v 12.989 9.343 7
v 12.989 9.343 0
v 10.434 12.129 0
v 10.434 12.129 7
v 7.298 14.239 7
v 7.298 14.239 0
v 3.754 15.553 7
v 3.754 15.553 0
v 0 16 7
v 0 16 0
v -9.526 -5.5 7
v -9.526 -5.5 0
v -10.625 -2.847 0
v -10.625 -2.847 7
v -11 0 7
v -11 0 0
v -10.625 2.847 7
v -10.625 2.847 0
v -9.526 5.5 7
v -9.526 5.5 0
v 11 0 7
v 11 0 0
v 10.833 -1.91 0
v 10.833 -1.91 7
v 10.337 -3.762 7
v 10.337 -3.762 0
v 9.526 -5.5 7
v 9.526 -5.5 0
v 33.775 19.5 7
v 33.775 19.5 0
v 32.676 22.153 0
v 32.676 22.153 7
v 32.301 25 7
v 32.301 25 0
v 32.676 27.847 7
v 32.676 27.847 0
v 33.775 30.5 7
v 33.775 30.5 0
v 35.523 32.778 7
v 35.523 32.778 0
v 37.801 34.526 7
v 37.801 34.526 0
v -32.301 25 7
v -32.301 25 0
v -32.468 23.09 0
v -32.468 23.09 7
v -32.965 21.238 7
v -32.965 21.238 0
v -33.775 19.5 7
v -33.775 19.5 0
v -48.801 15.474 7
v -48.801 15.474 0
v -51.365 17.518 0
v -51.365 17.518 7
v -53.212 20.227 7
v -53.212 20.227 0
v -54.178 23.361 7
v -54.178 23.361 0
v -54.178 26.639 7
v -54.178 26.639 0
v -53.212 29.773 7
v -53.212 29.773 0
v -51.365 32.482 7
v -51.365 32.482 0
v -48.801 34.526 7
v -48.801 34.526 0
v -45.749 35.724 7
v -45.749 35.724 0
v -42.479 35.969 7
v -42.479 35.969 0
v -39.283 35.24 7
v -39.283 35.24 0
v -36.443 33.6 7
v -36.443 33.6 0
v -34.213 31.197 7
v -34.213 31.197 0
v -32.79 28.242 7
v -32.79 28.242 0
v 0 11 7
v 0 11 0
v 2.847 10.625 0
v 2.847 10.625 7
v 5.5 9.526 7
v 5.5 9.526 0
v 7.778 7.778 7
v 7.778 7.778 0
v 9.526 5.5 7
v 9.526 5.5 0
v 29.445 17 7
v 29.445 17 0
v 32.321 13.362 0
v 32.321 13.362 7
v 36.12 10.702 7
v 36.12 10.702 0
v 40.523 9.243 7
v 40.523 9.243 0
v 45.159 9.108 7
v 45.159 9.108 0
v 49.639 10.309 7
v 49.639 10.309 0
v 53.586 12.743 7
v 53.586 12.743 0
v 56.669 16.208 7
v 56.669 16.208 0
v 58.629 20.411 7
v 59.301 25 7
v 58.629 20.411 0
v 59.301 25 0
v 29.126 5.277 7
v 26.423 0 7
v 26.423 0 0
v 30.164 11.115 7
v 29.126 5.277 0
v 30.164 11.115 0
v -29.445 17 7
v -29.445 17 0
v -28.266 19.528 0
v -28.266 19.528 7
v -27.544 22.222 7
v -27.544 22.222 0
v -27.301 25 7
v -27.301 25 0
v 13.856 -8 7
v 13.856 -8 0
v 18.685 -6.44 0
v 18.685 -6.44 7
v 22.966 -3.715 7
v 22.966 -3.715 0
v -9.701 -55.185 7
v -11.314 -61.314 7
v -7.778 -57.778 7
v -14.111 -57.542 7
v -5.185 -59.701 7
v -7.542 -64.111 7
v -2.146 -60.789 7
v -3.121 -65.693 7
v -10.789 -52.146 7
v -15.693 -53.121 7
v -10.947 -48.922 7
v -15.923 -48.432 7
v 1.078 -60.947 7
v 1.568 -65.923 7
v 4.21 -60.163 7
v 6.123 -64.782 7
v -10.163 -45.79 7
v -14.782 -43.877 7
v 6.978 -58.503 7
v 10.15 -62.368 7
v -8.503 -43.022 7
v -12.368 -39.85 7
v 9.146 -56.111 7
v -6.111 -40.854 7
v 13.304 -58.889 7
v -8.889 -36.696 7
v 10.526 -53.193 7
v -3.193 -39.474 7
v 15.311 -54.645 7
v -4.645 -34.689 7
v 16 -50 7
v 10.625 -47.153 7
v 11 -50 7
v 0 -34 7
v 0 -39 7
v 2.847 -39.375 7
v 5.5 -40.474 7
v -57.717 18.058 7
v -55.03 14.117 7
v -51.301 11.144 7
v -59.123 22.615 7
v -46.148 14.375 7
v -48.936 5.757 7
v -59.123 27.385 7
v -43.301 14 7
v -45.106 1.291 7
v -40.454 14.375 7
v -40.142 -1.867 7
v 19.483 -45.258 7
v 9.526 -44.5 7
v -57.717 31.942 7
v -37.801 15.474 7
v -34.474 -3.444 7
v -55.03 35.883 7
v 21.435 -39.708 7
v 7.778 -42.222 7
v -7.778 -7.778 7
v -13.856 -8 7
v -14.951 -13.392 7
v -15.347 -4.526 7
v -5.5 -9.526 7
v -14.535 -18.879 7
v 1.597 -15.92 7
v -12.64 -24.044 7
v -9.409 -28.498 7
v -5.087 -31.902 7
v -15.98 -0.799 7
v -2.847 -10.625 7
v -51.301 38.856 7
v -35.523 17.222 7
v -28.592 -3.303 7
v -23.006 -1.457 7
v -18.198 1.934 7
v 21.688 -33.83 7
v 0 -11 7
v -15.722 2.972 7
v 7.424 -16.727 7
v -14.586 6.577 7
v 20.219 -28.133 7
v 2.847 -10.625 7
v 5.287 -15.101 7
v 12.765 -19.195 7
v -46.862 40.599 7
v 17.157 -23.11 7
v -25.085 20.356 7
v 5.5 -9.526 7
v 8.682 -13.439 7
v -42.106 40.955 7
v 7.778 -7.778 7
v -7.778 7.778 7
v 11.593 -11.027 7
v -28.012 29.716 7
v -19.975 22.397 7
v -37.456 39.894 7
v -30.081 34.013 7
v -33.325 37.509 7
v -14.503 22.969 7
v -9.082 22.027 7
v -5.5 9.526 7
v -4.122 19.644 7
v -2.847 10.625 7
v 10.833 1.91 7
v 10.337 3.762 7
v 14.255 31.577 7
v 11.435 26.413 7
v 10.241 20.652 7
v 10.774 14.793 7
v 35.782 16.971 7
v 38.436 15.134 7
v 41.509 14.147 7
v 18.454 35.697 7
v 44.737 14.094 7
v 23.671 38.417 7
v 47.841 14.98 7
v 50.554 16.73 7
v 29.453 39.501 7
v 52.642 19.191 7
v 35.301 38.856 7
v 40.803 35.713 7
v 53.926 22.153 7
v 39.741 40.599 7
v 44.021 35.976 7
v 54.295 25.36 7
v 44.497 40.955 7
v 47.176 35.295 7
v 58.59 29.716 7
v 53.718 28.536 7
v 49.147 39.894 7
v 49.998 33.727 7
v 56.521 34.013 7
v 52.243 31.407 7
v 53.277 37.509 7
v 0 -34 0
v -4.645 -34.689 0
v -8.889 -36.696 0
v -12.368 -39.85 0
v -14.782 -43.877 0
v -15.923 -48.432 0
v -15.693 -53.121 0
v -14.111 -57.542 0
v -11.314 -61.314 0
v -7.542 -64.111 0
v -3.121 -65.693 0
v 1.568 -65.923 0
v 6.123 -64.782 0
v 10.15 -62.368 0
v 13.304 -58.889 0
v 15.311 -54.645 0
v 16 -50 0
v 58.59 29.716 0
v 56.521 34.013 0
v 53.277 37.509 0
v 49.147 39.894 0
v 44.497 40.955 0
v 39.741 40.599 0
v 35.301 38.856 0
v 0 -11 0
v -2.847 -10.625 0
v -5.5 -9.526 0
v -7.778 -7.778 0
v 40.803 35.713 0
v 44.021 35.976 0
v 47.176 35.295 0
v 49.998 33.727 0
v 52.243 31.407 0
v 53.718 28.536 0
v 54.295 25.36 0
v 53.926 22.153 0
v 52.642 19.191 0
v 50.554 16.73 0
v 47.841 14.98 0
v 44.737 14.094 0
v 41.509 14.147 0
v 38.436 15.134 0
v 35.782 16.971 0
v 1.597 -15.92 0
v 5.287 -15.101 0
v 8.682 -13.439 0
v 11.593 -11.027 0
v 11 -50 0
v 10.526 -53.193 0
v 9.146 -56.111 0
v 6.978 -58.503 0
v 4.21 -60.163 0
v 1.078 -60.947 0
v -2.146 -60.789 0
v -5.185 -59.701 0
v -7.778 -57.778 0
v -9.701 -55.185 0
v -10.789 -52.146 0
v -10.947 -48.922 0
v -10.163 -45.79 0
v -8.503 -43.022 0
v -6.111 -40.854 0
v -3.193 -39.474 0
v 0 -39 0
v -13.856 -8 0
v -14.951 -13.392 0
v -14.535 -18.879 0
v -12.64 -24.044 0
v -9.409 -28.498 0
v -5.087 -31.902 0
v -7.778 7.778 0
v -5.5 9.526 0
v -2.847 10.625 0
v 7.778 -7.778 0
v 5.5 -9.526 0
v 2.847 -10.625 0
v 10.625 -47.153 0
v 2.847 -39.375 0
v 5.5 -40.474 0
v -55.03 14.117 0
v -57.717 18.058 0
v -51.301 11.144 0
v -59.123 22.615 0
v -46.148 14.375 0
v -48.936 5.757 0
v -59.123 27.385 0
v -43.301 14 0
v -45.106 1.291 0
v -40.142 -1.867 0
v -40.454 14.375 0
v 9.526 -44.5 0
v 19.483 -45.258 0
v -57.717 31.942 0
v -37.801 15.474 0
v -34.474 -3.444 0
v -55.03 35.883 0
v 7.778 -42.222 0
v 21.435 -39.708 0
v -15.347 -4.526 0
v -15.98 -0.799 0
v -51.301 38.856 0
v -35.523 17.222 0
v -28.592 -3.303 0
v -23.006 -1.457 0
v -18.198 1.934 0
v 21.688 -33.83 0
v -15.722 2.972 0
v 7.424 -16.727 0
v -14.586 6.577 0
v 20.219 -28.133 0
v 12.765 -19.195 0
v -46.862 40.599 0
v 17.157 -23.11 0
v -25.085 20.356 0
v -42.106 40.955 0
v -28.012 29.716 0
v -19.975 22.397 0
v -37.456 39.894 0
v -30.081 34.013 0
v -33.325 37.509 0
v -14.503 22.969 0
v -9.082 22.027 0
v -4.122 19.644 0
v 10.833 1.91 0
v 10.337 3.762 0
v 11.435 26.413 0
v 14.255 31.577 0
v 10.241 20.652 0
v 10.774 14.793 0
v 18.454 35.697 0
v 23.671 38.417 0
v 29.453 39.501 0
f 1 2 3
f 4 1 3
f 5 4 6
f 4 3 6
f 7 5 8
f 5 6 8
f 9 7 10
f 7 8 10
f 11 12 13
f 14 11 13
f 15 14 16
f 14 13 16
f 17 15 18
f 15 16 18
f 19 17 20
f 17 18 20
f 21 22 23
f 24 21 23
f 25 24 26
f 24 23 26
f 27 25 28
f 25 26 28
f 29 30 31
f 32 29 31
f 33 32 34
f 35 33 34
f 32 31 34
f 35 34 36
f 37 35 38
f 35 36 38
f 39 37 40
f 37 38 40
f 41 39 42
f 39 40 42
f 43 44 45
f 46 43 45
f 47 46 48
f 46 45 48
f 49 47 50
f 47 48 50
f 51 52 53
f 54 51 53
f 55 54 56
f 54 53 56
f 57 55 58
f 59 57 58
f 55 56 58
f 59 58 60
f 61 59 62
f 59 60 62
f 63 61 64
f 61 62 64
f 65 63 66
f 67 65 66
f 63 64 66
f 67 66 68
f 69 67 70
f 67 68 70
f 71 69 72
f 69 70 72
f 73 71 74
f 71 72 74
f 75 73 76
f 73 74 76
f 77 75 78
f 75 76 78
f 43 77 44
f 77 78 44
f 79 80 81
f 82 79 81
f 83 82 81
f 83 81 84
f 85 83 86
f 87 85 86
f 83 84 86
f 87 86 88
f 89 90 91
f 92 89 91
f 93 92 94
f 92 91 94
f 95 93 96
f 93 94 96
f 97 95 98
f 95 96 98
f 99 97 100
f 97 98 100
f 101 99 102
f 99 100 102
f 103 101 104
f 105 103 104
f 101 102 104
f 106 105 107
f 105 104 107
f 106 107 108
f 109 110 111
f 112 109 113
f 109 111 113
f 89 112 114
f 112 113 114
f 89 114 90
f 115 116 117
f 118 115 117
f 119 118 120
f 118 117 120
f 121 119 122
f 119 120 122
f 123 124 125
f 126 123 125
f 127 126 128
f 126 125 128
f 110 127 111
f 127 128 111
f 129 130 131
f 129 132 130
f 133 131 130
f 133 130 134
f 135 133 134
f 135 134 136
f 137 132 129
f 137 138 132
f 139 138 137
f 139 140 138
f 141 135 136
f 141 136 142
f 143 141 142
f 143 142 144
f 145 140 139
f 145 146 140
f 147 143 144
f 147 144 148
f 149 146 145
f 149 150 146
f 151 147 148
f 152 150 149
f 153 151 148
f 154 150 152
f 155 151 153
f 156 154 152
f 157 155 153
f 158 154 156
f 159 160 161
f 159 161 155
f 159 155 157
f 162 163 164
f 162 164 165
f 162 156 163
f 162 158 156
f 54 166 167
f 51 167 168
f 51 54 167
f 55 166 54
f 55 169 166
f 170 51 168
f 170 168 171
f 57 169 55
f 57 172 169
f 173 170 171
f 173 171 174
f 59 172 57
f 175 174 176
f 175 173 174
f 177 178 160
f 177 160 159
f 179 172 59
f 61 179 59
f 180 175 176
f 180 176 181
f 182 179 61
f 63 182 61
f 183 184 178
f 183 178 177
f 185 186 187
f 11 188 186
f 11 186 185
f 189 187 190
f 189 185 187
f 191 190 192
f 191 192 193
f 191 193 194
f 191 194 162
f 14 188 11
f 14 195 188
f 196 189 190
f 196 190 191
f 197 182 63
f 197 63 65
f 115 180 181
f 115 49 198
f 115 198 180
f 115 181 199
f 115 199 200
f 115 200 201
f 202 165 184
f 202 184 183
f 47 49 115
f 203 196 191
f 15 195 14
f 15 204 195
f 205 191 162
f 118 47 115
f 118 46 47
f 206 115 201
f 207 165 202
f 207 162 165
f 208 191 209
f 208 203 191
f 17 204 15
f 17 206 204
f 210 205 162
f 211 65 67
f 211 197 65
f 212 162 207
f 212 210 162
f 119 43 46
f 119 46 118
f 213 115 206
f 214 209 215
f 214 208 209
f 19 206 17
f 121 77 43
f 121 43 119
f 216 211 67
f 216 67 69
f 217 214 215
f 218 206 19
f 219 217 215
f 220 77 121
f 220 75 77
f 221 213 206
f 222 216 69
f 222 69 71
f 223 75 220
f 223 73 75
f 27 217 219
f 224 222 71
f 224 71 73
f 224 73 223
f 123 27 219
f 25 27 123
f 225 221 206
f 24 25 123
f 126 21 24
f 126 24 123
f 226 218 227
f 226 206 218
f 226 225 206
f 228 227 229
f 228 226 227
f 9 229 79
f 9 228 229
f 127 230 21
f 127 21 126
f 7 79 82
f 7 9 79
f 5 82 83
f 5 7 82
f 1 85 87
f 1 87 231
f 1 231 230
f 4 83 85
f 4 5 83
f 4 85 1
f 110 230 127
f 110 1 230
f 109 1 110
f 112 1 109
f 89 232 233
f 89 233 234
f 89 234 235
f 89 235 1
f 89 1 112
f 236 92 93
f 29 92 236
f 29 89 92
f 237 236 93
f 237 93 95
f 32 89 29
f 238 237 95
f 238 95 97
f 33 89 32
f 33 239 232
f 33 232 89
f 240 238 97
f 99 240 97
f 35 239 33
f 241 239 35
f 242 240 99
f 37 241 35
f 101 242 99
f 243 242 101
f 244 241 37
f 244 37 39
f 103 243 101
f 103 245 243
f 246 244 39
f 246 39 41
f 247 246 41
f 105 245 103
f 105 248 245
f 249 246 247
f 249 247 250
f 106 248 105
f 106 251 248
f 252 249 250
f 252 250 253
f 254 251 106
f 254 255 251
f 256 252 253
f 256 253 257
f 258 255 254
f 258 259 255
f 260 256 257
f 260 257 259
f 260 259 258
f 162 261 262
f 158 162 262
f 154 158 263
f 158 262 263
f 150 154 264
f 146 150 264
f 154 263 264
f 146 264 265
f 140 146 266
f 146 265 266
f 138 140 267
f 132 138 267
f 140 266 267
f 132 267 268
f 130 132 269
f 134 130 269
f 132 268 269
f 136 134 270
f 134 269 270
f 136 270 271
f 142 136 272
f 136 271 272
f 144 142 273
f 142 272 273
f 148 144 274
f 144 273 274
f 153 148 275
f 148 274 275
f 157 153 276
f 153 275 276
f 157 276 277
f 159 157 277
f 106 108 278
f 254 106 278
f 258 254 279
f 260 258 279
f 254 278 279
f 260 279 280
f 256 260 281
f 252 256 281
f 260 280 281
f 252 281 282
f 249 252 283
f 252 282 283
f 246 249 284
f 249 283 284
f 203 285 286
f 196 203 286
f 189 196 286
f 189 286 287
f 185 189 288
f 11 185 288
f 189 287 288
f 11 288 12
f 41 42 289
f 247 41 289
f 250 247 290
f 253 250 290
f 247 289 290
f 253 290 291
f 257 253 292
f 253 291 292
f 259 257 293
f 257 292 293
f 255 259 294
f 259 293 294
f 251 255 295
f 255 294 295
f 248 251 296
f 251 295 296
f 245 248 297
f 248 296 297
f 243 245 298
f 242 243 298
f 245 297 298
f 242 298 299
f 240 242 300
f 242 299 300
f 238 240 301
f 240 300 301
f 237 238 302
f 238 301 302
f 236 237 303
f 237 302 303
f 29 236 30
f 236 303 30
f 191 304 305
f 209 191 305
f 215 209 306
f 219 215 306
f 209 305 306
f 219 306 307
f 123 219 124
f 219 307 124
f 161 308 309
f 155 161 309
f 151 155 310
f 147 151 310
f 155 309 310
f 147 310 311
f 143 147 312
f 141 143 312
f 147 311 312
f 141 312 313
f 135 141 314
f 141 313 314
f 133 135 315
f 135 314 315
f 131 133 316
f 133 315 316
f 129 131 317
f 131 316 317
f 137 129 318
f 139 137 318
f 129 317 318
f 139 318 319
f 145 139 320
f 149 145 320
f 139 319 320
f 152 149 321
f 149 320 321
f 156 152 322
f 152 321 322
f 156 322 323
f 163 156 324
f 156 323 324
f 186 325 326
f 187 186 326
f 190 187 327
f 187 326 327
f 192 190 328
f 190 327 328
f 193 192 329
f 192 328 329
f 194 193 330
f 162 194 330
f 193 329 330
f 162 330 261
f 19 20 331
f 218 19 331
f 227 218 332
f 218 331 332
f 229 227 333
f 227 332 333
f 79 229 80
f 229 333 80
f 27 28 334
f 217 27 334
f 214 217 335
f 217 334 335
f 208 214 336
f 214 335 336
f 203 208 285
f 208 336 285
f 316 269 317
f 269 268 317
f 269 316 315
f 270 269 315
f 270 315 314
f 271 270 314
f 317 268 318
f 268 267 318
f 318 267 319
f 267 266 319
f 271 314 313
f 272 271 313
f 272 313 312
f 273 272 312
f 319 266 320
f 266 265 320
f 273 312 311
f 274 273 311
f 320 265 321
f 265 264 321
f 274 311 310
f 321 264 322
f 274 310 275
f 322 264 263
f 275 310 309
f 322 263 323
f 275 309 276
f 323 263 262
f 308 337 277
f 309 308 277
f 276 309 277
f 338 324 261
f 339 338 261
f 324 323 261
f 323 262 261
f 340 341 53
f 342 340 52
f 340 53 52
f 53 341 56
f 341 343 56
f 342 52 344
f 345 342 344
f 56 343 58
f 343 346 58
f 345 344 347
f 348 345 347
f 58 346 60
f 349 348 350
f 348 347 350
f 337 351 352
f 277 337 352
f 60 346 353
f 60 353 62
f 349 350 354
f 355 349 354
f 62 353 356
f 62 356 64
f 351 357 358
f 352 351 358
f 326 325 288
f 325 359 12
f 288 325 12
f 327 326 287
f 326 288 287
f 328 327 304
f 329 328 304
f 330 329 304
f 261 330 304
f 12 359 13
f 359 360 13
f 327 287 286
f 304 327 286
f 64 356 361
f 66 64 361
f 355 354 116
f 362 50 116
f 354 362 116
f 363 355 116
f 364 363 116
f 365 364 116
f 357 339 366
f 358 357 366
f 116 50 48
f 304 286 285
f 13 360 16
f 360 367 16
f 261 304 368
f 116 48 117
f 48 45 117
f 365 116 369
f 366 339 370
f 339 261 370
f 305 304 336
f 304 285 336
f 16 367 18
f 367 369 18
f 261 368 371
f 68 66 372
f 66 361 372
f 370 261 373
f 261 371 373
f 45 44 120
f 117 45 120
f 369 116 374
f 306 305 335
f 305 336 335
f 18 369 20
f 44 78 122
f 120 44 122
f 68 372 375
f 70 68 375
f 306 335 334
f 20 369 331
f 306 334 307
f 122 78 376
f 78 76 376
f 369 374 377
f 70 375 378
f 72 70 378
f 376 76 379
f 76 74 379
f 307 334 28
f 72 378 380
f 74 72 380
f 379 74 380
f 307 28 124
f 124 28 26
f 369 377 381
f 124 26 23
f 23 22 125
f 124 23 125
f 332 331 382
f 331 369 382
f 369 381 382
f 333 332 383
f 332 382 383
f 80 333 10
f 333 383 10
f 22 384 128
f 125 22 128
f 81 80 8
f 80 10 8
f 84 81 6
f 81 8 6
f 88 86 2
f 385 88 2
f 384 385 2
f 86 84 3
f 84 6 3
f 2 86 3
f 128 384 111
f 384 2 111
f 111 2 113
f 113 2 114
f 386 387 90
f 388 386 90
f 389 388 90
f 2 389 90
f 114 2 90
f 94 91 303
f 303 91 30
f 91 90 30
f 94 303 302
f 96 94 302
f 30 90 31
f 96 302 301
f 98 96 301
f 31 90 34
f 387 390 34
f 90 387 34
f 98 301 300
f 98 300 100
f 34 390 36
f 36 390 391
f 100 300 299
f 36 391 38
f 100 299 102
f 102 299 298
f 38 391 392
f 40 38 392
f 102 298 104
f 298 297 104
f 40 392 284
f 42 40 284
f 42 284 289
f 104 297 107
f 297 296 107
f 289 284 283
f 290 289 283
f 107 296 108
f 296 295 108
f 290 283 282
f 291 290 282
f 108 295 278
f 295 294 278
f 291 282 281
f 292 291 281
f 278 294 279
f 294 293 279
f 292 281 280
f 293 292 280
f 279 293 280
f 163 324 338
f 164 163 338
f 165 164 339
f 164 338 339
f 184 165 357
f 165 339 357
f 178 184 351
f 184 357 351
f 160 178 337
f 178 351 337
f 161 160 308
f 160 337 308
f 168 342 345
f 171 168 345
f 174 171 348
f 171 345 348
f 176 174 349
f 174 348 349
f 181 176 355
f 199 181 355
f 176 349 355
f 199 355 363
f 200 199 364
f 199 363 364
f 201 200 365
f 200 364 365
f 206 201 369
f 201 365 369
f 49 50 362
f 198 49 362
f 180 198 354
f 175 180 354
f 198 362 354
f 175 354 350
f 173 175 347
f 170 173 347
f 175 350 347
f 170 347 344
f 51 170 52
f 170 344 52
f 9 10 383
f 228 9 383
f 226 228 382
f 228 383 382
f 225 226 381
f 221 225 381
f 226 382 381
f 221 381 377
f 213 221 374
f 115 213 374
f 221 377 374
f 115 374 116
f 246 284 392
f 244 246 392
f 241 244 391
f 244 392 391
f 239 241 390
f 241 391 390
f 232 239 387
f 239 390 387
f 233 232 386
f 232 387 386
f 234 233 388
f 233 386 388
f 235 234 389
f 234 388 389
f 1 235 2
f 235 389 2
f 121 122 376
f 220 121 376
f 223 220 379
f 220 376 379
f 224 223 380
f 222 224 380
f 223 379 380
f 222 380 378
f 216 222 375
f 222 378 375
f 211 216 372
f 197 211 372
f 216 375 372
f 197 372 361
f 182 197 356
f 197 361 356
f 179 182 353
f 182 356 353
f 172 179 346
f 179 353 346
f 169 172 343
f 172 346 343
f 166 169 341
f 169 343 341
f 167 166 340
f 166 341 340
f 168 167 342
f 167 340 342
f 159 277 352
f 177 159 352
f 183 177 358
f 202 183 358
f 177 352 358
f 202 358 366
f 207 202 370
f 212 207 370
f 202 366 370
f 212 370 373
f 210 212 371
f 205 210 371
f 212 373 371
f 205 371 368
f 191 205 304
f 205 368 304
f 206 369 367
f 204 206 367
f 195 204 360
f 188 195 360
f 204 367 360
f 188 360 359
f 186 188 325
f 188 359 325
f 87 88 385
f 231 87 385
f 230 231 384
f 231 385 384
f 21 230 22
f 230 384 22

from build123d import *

# Parameters (mm, degrees)
F1_DEPTH = 7


# Not quite as in the source:
# - a feature names something its author has since deleted; it is built from what else it names


with BuildPart() as f1:
    # F0 (on Top) → F1 (new body)
    with BuildSketch(Plane.XY):
        with BuildLine():
            Line((16, 0), (11, 0))
            ThreePointArc((11, 0), (10.6251840892, -2.8470094961), (9.5262794416, -5.5))
            Line((9.5262794416, -5.5), (13.8564064606, -8))
            ThreePointArc((13.8564064606, -8), (15.4548132206, -4.1411047216), (16, 0))
        make_face()
        with BuildLine():
            ThreePointArc((9.5262794416, 5.5), (10.6251840892, 2.8470094961), (11, 0))
            Line((11, 0), (16, 0))
            ThreePointArc((16, 0), (15.4548132206, 4.1411047216), (13.8564064606, 8))
            Line((13.8564064606, 8), (9.5262794416, 5.5))
        make_face()
        with BuildLine():
            ThreePointArc((0, 11), (5.5, 9.5262794416), (9.5262794416, 5.5))
            Line((9.5262794416, 5.5), (13.8564064606, 8))
            ThreePointArc((13.8564064606, 8), (13.409185793, 8.6628012124), (12.9888150126, 9.3429483874))
            ThreePointArc((12.9888150126, 9.3429483874), (7.2976991512, 14.2388056767), (0, 16))
            Line((0, 16), (0, 11))
        make_face()
        with BuildLine():
            Line((13.8564064606, -8), (9.5262794416, -5.5))
            ThreePointArc((9.5262794416, -5.5), (5.5, -9.5262794416), (0, -11))
            Line((0, -11), (0, -16))
            ThreePointArc((0, -16), (0.7976130214, -15.944096147), (1.5968231434, -15.9201179596))
            ThreePointArc((1.5968231434, -15.9201179596), (8.68231786, -13.4393956924), (13.8564064606, -8))
        make_face()
        with BuildLine():
            Line((26.4227403385, 0), (16, 0))
            ThreePointArc((16, 0), (15.4548132206, -4.1411047216), (13.8564064606, -8))
            ThreePointArc((13.8564064606, -8), (20.912199664, -5.2136349503), (26.4227403385, 0))
        make_face()
        with BuildLine():
            ThreePointArc((13.8564064606, 8), (15.4548132206, 4.1411047216), (16, 0))
            Line((16, 0), (26.4227403385, 0))
            ThreePointArc((26.4227403385, 0), (29.8628617611, 8.1570672633), (29.4448637287, 17))
            Line((29.4448637287, 17), (13.8564064606, 8))
        make_face()
        with BuildLine():
            ThreePointArc((-9.5262794416, 5.5), (-5.5, 9.5262794416), (0, 11))
            Line((0, 11), (0, 16))
            ThreePointArc((0, 16), (-8, 13.8564064606), (-13.8564064606, 8))
            Line((-13.8564064606, 8), (-9.5262794416, 5.5))
        make_face()
        with BuildLine():
            ThreePointArc((12.9888150126, 9.3429483874), (13.409185793, 8.6628012124), (13.8564064606, 8))
            ThreePointArc((13.8564064606, 8), (13.4393956924, 8.68231786), (12.9888150126, 9.3429483874))
        make_face()
        with BuildLine():
            ThreePointArc((12.9888150126, 9.3429483874), (13.4393956924, 8.68231786), (13.8564064606, 8))
            Line((13.8564064606, 8), (29.4448637287, 17))
            ThreePointArc((29.4448637287, 17), (27.8464569686, 29.1411047216), (35.3012701892, 38.8564064606))
            ThreePointArc((35.3012701892, 38.8564064606), (14.2545680685, 31.576970296), (12.9888150126, 9.3429483874))
        make_face()
        with BuildLine():
            Line((0, -16), (0, -11))
            ThreePointArc((0, -11), (-5.5, -9.5262794416), (-9.5262794416, -5.5))
            Line((-9.5262794416, -5.5), (-13.8564064606, -8))
            ThreePointArc((-13.8564064606, -8), (-8, -13.8564064606), (0, -16))
        make_face()
        with BuildLine():
            ThreePointArc((-9.5262794416, -5.5), (-11, 0), (-9.5262794416, 5.5))
            Line((-9.5262794416, 5.5), (-13.8564064606, 8))
            ThreePointArc((-13.8564064606, 8), (-14.2067988144, 7.2812949346), (-14.585638156, 6.5771695722))
            ThreePointArc((-14.585638156, 6.5771695722), (-15.9800170112, -0.7994099843), (-13.8564064606, -8))
            Line((-13.8564064606, -8), (-9.5262794416, -5.5))
        make_face()
        with BuildLine():
            ThreePointArc((-13.8564064606, 8), (-8, 13.8564064606), (0, 16))
            ThreePointArc((0, 16), (-14.5027493597, 22.9685214121), (-29.4448637287, 17))
            Line((-29.4448637287, 17), (-13.8564064606, 8))
        make_face()
        with BuildLine():
            ThreePointArc((35.3012701892, 38.8564064606), (27.8464569686, 29.1411047216), (29.4448637287, 17))
            Line((29.4448637287, 17), (33.7749907476, 19.5))
            ThreePointArc((33.7749907476, 19.5), (32.6760861, 27.8470094961), (37.8012701892, 34.5262794416))
            Line((37.8012701892, 34.5262794416), (35.3012701892, 38.8564064606))
        make_face()
        with BuildLine():
            Line((33.7749907476, 19.5), (29.4448637287, 17))
            ThreePointArc((29.4448637287, 17), (47.4423749109, 9.5451867794), (59.3012701892, 25))
            ThreePointArc((59.3012701892, 25), (51.3012701892, 38.8564064606), (35.3012701892, 38.8564064606))
            Line((35.3012701892, 38.8564064606), (37.8012701892, 34.5262794416))
            ThreePointArc((37.8012701892, 34.5262794416), (48.8012701892, 34.5262794416), (54.3012701892, 25))
            ThreePointArc((54.3012701892, 25), (46.1482796853, 14.3748159108), (33.7749907476, 19.5))
        make_face()
        with BuildLine():
            Line((0, -34), (0, -16))
            ThreePointArc((0, -16), (-8, -13.8564064606), (-13.8564064606, -8))
            ThreePointArc((-13.8564064606, -8), (-12.6399483504, -24.0440100763), (0, -34))
        make_face()
        with BuildLine():
            ThreePointArc((1.5968231434, -15.9201179596), (0.7976130214, -15.944096147), (0, -16))
            ThreePointArc((0, -16), (0.7994099843, -15.9800170112), (1.5968231434, -15.9201179596))
        make_face()
        with BuildLine():
            ThreePointArc((1.5968231434, -15.9201179596), (0.7994099843, -15.9800170112), (0, -16))
            Line((0, -16), (0, -34))
            ThreePointArc((0, -34), (11.313708499, -38.686291501), (16, -50))
            ThreePointArc((16, -50), (20.2191744167, -28.1333032153), (1.5968231434, -15.9201179596))
        make_face()
        with BuildLine():
            ThreePointArc((-14.585638156, 6.5771695722), (-14.2067988144, 7.2812949346), (-13.8564064606, 8))
            ThreePointArc((-13.8564064606, 8), (-14.2388056767, 7.2976991512), (-14.585638156, 6.5771695722))
        make_face()
        with BuildLine():
            ThreePointArc((-14.585638156, 6.5771695722), (-14.2388056767, 7.2976991512), (-13.8564064606, 8))
            Line((-13.8564064606, 8), (-29.4448637287, 17))
            ThreePointArc((-29.4448637287, 17), (-39.1601654676, 9.5451867794), (-51.3012701892, 11.1435935394))
            ThreePointArc((-51.3012701892, 11.1435935394), (-34.4737424851, -3.4436670807), (-14.585638156, 6.5771695722))
        make_face()
        with BuildLine():
            ThreePointArc((-51.3012701892, 11.1435935394), (-39.1601654676, 9.5451867794), (-29.4448637287, 17))
            Line((-29.4448637287, 17), (-33.7749907476, 19.5))
            ThreePointArc((-33.7749907476, 19.5), (-40.4542606931, 14.3748159108), (-48.8012701892, 15.4737205584))
            Line((-48.8012701892, 15.4737205584), (-51.3012701892, 11.1435935394))
        make_face()
        with BuildLine():
            Line((-33.7749907476, 19.5), (-29.4448637287, 17))
            ThreePointArc((-29.4448637287, 17), (-27.8464569686, 20.8588952784), (-27.3012701892, 25))
            ThreePointArc((-27.3012701892, 25), (-51.3012701892, 38.8564064606), (-51.3012701892, 11.1435935394))
            Line((-51.3012701892, 11.1435935394), (-48.8012701892, 15.4737205584))
            ThreePointArc((-48.8012701892, 15.4737205584), (-48.8012701892, 34.5262794416), (-32.3012701892, 25))
            ThreePointArc((-32.3012701892, 25), (-32.6760861, 22.1529905039), (-33.7749907476, 19.5))
        make_face()
        with BuildLine():
            ThreePointArc((16, -50), (11.313708499, -38.686291501), (0, -34))
            Line((0, -34), (0, -39))
            ThreePointArc((0, -39), (7.7781745931, -42.2218254069), (11, -50))
            Line((11, -50), (16, -50))
        make_face()
        with BuildLine():
            Line((0, -39), (0, -34))
            ThreePointArc((0, -34), (-11.313708499, -61.313708499), (16, -50))
            Line((16, -50), (11, -50))
            ThreePointArc((11, -50), (-7.7781745931, -57.7781745931), (0, -39))
        make_face()
    extrude(amount=F1_DEPTH)


solid = f1.part
